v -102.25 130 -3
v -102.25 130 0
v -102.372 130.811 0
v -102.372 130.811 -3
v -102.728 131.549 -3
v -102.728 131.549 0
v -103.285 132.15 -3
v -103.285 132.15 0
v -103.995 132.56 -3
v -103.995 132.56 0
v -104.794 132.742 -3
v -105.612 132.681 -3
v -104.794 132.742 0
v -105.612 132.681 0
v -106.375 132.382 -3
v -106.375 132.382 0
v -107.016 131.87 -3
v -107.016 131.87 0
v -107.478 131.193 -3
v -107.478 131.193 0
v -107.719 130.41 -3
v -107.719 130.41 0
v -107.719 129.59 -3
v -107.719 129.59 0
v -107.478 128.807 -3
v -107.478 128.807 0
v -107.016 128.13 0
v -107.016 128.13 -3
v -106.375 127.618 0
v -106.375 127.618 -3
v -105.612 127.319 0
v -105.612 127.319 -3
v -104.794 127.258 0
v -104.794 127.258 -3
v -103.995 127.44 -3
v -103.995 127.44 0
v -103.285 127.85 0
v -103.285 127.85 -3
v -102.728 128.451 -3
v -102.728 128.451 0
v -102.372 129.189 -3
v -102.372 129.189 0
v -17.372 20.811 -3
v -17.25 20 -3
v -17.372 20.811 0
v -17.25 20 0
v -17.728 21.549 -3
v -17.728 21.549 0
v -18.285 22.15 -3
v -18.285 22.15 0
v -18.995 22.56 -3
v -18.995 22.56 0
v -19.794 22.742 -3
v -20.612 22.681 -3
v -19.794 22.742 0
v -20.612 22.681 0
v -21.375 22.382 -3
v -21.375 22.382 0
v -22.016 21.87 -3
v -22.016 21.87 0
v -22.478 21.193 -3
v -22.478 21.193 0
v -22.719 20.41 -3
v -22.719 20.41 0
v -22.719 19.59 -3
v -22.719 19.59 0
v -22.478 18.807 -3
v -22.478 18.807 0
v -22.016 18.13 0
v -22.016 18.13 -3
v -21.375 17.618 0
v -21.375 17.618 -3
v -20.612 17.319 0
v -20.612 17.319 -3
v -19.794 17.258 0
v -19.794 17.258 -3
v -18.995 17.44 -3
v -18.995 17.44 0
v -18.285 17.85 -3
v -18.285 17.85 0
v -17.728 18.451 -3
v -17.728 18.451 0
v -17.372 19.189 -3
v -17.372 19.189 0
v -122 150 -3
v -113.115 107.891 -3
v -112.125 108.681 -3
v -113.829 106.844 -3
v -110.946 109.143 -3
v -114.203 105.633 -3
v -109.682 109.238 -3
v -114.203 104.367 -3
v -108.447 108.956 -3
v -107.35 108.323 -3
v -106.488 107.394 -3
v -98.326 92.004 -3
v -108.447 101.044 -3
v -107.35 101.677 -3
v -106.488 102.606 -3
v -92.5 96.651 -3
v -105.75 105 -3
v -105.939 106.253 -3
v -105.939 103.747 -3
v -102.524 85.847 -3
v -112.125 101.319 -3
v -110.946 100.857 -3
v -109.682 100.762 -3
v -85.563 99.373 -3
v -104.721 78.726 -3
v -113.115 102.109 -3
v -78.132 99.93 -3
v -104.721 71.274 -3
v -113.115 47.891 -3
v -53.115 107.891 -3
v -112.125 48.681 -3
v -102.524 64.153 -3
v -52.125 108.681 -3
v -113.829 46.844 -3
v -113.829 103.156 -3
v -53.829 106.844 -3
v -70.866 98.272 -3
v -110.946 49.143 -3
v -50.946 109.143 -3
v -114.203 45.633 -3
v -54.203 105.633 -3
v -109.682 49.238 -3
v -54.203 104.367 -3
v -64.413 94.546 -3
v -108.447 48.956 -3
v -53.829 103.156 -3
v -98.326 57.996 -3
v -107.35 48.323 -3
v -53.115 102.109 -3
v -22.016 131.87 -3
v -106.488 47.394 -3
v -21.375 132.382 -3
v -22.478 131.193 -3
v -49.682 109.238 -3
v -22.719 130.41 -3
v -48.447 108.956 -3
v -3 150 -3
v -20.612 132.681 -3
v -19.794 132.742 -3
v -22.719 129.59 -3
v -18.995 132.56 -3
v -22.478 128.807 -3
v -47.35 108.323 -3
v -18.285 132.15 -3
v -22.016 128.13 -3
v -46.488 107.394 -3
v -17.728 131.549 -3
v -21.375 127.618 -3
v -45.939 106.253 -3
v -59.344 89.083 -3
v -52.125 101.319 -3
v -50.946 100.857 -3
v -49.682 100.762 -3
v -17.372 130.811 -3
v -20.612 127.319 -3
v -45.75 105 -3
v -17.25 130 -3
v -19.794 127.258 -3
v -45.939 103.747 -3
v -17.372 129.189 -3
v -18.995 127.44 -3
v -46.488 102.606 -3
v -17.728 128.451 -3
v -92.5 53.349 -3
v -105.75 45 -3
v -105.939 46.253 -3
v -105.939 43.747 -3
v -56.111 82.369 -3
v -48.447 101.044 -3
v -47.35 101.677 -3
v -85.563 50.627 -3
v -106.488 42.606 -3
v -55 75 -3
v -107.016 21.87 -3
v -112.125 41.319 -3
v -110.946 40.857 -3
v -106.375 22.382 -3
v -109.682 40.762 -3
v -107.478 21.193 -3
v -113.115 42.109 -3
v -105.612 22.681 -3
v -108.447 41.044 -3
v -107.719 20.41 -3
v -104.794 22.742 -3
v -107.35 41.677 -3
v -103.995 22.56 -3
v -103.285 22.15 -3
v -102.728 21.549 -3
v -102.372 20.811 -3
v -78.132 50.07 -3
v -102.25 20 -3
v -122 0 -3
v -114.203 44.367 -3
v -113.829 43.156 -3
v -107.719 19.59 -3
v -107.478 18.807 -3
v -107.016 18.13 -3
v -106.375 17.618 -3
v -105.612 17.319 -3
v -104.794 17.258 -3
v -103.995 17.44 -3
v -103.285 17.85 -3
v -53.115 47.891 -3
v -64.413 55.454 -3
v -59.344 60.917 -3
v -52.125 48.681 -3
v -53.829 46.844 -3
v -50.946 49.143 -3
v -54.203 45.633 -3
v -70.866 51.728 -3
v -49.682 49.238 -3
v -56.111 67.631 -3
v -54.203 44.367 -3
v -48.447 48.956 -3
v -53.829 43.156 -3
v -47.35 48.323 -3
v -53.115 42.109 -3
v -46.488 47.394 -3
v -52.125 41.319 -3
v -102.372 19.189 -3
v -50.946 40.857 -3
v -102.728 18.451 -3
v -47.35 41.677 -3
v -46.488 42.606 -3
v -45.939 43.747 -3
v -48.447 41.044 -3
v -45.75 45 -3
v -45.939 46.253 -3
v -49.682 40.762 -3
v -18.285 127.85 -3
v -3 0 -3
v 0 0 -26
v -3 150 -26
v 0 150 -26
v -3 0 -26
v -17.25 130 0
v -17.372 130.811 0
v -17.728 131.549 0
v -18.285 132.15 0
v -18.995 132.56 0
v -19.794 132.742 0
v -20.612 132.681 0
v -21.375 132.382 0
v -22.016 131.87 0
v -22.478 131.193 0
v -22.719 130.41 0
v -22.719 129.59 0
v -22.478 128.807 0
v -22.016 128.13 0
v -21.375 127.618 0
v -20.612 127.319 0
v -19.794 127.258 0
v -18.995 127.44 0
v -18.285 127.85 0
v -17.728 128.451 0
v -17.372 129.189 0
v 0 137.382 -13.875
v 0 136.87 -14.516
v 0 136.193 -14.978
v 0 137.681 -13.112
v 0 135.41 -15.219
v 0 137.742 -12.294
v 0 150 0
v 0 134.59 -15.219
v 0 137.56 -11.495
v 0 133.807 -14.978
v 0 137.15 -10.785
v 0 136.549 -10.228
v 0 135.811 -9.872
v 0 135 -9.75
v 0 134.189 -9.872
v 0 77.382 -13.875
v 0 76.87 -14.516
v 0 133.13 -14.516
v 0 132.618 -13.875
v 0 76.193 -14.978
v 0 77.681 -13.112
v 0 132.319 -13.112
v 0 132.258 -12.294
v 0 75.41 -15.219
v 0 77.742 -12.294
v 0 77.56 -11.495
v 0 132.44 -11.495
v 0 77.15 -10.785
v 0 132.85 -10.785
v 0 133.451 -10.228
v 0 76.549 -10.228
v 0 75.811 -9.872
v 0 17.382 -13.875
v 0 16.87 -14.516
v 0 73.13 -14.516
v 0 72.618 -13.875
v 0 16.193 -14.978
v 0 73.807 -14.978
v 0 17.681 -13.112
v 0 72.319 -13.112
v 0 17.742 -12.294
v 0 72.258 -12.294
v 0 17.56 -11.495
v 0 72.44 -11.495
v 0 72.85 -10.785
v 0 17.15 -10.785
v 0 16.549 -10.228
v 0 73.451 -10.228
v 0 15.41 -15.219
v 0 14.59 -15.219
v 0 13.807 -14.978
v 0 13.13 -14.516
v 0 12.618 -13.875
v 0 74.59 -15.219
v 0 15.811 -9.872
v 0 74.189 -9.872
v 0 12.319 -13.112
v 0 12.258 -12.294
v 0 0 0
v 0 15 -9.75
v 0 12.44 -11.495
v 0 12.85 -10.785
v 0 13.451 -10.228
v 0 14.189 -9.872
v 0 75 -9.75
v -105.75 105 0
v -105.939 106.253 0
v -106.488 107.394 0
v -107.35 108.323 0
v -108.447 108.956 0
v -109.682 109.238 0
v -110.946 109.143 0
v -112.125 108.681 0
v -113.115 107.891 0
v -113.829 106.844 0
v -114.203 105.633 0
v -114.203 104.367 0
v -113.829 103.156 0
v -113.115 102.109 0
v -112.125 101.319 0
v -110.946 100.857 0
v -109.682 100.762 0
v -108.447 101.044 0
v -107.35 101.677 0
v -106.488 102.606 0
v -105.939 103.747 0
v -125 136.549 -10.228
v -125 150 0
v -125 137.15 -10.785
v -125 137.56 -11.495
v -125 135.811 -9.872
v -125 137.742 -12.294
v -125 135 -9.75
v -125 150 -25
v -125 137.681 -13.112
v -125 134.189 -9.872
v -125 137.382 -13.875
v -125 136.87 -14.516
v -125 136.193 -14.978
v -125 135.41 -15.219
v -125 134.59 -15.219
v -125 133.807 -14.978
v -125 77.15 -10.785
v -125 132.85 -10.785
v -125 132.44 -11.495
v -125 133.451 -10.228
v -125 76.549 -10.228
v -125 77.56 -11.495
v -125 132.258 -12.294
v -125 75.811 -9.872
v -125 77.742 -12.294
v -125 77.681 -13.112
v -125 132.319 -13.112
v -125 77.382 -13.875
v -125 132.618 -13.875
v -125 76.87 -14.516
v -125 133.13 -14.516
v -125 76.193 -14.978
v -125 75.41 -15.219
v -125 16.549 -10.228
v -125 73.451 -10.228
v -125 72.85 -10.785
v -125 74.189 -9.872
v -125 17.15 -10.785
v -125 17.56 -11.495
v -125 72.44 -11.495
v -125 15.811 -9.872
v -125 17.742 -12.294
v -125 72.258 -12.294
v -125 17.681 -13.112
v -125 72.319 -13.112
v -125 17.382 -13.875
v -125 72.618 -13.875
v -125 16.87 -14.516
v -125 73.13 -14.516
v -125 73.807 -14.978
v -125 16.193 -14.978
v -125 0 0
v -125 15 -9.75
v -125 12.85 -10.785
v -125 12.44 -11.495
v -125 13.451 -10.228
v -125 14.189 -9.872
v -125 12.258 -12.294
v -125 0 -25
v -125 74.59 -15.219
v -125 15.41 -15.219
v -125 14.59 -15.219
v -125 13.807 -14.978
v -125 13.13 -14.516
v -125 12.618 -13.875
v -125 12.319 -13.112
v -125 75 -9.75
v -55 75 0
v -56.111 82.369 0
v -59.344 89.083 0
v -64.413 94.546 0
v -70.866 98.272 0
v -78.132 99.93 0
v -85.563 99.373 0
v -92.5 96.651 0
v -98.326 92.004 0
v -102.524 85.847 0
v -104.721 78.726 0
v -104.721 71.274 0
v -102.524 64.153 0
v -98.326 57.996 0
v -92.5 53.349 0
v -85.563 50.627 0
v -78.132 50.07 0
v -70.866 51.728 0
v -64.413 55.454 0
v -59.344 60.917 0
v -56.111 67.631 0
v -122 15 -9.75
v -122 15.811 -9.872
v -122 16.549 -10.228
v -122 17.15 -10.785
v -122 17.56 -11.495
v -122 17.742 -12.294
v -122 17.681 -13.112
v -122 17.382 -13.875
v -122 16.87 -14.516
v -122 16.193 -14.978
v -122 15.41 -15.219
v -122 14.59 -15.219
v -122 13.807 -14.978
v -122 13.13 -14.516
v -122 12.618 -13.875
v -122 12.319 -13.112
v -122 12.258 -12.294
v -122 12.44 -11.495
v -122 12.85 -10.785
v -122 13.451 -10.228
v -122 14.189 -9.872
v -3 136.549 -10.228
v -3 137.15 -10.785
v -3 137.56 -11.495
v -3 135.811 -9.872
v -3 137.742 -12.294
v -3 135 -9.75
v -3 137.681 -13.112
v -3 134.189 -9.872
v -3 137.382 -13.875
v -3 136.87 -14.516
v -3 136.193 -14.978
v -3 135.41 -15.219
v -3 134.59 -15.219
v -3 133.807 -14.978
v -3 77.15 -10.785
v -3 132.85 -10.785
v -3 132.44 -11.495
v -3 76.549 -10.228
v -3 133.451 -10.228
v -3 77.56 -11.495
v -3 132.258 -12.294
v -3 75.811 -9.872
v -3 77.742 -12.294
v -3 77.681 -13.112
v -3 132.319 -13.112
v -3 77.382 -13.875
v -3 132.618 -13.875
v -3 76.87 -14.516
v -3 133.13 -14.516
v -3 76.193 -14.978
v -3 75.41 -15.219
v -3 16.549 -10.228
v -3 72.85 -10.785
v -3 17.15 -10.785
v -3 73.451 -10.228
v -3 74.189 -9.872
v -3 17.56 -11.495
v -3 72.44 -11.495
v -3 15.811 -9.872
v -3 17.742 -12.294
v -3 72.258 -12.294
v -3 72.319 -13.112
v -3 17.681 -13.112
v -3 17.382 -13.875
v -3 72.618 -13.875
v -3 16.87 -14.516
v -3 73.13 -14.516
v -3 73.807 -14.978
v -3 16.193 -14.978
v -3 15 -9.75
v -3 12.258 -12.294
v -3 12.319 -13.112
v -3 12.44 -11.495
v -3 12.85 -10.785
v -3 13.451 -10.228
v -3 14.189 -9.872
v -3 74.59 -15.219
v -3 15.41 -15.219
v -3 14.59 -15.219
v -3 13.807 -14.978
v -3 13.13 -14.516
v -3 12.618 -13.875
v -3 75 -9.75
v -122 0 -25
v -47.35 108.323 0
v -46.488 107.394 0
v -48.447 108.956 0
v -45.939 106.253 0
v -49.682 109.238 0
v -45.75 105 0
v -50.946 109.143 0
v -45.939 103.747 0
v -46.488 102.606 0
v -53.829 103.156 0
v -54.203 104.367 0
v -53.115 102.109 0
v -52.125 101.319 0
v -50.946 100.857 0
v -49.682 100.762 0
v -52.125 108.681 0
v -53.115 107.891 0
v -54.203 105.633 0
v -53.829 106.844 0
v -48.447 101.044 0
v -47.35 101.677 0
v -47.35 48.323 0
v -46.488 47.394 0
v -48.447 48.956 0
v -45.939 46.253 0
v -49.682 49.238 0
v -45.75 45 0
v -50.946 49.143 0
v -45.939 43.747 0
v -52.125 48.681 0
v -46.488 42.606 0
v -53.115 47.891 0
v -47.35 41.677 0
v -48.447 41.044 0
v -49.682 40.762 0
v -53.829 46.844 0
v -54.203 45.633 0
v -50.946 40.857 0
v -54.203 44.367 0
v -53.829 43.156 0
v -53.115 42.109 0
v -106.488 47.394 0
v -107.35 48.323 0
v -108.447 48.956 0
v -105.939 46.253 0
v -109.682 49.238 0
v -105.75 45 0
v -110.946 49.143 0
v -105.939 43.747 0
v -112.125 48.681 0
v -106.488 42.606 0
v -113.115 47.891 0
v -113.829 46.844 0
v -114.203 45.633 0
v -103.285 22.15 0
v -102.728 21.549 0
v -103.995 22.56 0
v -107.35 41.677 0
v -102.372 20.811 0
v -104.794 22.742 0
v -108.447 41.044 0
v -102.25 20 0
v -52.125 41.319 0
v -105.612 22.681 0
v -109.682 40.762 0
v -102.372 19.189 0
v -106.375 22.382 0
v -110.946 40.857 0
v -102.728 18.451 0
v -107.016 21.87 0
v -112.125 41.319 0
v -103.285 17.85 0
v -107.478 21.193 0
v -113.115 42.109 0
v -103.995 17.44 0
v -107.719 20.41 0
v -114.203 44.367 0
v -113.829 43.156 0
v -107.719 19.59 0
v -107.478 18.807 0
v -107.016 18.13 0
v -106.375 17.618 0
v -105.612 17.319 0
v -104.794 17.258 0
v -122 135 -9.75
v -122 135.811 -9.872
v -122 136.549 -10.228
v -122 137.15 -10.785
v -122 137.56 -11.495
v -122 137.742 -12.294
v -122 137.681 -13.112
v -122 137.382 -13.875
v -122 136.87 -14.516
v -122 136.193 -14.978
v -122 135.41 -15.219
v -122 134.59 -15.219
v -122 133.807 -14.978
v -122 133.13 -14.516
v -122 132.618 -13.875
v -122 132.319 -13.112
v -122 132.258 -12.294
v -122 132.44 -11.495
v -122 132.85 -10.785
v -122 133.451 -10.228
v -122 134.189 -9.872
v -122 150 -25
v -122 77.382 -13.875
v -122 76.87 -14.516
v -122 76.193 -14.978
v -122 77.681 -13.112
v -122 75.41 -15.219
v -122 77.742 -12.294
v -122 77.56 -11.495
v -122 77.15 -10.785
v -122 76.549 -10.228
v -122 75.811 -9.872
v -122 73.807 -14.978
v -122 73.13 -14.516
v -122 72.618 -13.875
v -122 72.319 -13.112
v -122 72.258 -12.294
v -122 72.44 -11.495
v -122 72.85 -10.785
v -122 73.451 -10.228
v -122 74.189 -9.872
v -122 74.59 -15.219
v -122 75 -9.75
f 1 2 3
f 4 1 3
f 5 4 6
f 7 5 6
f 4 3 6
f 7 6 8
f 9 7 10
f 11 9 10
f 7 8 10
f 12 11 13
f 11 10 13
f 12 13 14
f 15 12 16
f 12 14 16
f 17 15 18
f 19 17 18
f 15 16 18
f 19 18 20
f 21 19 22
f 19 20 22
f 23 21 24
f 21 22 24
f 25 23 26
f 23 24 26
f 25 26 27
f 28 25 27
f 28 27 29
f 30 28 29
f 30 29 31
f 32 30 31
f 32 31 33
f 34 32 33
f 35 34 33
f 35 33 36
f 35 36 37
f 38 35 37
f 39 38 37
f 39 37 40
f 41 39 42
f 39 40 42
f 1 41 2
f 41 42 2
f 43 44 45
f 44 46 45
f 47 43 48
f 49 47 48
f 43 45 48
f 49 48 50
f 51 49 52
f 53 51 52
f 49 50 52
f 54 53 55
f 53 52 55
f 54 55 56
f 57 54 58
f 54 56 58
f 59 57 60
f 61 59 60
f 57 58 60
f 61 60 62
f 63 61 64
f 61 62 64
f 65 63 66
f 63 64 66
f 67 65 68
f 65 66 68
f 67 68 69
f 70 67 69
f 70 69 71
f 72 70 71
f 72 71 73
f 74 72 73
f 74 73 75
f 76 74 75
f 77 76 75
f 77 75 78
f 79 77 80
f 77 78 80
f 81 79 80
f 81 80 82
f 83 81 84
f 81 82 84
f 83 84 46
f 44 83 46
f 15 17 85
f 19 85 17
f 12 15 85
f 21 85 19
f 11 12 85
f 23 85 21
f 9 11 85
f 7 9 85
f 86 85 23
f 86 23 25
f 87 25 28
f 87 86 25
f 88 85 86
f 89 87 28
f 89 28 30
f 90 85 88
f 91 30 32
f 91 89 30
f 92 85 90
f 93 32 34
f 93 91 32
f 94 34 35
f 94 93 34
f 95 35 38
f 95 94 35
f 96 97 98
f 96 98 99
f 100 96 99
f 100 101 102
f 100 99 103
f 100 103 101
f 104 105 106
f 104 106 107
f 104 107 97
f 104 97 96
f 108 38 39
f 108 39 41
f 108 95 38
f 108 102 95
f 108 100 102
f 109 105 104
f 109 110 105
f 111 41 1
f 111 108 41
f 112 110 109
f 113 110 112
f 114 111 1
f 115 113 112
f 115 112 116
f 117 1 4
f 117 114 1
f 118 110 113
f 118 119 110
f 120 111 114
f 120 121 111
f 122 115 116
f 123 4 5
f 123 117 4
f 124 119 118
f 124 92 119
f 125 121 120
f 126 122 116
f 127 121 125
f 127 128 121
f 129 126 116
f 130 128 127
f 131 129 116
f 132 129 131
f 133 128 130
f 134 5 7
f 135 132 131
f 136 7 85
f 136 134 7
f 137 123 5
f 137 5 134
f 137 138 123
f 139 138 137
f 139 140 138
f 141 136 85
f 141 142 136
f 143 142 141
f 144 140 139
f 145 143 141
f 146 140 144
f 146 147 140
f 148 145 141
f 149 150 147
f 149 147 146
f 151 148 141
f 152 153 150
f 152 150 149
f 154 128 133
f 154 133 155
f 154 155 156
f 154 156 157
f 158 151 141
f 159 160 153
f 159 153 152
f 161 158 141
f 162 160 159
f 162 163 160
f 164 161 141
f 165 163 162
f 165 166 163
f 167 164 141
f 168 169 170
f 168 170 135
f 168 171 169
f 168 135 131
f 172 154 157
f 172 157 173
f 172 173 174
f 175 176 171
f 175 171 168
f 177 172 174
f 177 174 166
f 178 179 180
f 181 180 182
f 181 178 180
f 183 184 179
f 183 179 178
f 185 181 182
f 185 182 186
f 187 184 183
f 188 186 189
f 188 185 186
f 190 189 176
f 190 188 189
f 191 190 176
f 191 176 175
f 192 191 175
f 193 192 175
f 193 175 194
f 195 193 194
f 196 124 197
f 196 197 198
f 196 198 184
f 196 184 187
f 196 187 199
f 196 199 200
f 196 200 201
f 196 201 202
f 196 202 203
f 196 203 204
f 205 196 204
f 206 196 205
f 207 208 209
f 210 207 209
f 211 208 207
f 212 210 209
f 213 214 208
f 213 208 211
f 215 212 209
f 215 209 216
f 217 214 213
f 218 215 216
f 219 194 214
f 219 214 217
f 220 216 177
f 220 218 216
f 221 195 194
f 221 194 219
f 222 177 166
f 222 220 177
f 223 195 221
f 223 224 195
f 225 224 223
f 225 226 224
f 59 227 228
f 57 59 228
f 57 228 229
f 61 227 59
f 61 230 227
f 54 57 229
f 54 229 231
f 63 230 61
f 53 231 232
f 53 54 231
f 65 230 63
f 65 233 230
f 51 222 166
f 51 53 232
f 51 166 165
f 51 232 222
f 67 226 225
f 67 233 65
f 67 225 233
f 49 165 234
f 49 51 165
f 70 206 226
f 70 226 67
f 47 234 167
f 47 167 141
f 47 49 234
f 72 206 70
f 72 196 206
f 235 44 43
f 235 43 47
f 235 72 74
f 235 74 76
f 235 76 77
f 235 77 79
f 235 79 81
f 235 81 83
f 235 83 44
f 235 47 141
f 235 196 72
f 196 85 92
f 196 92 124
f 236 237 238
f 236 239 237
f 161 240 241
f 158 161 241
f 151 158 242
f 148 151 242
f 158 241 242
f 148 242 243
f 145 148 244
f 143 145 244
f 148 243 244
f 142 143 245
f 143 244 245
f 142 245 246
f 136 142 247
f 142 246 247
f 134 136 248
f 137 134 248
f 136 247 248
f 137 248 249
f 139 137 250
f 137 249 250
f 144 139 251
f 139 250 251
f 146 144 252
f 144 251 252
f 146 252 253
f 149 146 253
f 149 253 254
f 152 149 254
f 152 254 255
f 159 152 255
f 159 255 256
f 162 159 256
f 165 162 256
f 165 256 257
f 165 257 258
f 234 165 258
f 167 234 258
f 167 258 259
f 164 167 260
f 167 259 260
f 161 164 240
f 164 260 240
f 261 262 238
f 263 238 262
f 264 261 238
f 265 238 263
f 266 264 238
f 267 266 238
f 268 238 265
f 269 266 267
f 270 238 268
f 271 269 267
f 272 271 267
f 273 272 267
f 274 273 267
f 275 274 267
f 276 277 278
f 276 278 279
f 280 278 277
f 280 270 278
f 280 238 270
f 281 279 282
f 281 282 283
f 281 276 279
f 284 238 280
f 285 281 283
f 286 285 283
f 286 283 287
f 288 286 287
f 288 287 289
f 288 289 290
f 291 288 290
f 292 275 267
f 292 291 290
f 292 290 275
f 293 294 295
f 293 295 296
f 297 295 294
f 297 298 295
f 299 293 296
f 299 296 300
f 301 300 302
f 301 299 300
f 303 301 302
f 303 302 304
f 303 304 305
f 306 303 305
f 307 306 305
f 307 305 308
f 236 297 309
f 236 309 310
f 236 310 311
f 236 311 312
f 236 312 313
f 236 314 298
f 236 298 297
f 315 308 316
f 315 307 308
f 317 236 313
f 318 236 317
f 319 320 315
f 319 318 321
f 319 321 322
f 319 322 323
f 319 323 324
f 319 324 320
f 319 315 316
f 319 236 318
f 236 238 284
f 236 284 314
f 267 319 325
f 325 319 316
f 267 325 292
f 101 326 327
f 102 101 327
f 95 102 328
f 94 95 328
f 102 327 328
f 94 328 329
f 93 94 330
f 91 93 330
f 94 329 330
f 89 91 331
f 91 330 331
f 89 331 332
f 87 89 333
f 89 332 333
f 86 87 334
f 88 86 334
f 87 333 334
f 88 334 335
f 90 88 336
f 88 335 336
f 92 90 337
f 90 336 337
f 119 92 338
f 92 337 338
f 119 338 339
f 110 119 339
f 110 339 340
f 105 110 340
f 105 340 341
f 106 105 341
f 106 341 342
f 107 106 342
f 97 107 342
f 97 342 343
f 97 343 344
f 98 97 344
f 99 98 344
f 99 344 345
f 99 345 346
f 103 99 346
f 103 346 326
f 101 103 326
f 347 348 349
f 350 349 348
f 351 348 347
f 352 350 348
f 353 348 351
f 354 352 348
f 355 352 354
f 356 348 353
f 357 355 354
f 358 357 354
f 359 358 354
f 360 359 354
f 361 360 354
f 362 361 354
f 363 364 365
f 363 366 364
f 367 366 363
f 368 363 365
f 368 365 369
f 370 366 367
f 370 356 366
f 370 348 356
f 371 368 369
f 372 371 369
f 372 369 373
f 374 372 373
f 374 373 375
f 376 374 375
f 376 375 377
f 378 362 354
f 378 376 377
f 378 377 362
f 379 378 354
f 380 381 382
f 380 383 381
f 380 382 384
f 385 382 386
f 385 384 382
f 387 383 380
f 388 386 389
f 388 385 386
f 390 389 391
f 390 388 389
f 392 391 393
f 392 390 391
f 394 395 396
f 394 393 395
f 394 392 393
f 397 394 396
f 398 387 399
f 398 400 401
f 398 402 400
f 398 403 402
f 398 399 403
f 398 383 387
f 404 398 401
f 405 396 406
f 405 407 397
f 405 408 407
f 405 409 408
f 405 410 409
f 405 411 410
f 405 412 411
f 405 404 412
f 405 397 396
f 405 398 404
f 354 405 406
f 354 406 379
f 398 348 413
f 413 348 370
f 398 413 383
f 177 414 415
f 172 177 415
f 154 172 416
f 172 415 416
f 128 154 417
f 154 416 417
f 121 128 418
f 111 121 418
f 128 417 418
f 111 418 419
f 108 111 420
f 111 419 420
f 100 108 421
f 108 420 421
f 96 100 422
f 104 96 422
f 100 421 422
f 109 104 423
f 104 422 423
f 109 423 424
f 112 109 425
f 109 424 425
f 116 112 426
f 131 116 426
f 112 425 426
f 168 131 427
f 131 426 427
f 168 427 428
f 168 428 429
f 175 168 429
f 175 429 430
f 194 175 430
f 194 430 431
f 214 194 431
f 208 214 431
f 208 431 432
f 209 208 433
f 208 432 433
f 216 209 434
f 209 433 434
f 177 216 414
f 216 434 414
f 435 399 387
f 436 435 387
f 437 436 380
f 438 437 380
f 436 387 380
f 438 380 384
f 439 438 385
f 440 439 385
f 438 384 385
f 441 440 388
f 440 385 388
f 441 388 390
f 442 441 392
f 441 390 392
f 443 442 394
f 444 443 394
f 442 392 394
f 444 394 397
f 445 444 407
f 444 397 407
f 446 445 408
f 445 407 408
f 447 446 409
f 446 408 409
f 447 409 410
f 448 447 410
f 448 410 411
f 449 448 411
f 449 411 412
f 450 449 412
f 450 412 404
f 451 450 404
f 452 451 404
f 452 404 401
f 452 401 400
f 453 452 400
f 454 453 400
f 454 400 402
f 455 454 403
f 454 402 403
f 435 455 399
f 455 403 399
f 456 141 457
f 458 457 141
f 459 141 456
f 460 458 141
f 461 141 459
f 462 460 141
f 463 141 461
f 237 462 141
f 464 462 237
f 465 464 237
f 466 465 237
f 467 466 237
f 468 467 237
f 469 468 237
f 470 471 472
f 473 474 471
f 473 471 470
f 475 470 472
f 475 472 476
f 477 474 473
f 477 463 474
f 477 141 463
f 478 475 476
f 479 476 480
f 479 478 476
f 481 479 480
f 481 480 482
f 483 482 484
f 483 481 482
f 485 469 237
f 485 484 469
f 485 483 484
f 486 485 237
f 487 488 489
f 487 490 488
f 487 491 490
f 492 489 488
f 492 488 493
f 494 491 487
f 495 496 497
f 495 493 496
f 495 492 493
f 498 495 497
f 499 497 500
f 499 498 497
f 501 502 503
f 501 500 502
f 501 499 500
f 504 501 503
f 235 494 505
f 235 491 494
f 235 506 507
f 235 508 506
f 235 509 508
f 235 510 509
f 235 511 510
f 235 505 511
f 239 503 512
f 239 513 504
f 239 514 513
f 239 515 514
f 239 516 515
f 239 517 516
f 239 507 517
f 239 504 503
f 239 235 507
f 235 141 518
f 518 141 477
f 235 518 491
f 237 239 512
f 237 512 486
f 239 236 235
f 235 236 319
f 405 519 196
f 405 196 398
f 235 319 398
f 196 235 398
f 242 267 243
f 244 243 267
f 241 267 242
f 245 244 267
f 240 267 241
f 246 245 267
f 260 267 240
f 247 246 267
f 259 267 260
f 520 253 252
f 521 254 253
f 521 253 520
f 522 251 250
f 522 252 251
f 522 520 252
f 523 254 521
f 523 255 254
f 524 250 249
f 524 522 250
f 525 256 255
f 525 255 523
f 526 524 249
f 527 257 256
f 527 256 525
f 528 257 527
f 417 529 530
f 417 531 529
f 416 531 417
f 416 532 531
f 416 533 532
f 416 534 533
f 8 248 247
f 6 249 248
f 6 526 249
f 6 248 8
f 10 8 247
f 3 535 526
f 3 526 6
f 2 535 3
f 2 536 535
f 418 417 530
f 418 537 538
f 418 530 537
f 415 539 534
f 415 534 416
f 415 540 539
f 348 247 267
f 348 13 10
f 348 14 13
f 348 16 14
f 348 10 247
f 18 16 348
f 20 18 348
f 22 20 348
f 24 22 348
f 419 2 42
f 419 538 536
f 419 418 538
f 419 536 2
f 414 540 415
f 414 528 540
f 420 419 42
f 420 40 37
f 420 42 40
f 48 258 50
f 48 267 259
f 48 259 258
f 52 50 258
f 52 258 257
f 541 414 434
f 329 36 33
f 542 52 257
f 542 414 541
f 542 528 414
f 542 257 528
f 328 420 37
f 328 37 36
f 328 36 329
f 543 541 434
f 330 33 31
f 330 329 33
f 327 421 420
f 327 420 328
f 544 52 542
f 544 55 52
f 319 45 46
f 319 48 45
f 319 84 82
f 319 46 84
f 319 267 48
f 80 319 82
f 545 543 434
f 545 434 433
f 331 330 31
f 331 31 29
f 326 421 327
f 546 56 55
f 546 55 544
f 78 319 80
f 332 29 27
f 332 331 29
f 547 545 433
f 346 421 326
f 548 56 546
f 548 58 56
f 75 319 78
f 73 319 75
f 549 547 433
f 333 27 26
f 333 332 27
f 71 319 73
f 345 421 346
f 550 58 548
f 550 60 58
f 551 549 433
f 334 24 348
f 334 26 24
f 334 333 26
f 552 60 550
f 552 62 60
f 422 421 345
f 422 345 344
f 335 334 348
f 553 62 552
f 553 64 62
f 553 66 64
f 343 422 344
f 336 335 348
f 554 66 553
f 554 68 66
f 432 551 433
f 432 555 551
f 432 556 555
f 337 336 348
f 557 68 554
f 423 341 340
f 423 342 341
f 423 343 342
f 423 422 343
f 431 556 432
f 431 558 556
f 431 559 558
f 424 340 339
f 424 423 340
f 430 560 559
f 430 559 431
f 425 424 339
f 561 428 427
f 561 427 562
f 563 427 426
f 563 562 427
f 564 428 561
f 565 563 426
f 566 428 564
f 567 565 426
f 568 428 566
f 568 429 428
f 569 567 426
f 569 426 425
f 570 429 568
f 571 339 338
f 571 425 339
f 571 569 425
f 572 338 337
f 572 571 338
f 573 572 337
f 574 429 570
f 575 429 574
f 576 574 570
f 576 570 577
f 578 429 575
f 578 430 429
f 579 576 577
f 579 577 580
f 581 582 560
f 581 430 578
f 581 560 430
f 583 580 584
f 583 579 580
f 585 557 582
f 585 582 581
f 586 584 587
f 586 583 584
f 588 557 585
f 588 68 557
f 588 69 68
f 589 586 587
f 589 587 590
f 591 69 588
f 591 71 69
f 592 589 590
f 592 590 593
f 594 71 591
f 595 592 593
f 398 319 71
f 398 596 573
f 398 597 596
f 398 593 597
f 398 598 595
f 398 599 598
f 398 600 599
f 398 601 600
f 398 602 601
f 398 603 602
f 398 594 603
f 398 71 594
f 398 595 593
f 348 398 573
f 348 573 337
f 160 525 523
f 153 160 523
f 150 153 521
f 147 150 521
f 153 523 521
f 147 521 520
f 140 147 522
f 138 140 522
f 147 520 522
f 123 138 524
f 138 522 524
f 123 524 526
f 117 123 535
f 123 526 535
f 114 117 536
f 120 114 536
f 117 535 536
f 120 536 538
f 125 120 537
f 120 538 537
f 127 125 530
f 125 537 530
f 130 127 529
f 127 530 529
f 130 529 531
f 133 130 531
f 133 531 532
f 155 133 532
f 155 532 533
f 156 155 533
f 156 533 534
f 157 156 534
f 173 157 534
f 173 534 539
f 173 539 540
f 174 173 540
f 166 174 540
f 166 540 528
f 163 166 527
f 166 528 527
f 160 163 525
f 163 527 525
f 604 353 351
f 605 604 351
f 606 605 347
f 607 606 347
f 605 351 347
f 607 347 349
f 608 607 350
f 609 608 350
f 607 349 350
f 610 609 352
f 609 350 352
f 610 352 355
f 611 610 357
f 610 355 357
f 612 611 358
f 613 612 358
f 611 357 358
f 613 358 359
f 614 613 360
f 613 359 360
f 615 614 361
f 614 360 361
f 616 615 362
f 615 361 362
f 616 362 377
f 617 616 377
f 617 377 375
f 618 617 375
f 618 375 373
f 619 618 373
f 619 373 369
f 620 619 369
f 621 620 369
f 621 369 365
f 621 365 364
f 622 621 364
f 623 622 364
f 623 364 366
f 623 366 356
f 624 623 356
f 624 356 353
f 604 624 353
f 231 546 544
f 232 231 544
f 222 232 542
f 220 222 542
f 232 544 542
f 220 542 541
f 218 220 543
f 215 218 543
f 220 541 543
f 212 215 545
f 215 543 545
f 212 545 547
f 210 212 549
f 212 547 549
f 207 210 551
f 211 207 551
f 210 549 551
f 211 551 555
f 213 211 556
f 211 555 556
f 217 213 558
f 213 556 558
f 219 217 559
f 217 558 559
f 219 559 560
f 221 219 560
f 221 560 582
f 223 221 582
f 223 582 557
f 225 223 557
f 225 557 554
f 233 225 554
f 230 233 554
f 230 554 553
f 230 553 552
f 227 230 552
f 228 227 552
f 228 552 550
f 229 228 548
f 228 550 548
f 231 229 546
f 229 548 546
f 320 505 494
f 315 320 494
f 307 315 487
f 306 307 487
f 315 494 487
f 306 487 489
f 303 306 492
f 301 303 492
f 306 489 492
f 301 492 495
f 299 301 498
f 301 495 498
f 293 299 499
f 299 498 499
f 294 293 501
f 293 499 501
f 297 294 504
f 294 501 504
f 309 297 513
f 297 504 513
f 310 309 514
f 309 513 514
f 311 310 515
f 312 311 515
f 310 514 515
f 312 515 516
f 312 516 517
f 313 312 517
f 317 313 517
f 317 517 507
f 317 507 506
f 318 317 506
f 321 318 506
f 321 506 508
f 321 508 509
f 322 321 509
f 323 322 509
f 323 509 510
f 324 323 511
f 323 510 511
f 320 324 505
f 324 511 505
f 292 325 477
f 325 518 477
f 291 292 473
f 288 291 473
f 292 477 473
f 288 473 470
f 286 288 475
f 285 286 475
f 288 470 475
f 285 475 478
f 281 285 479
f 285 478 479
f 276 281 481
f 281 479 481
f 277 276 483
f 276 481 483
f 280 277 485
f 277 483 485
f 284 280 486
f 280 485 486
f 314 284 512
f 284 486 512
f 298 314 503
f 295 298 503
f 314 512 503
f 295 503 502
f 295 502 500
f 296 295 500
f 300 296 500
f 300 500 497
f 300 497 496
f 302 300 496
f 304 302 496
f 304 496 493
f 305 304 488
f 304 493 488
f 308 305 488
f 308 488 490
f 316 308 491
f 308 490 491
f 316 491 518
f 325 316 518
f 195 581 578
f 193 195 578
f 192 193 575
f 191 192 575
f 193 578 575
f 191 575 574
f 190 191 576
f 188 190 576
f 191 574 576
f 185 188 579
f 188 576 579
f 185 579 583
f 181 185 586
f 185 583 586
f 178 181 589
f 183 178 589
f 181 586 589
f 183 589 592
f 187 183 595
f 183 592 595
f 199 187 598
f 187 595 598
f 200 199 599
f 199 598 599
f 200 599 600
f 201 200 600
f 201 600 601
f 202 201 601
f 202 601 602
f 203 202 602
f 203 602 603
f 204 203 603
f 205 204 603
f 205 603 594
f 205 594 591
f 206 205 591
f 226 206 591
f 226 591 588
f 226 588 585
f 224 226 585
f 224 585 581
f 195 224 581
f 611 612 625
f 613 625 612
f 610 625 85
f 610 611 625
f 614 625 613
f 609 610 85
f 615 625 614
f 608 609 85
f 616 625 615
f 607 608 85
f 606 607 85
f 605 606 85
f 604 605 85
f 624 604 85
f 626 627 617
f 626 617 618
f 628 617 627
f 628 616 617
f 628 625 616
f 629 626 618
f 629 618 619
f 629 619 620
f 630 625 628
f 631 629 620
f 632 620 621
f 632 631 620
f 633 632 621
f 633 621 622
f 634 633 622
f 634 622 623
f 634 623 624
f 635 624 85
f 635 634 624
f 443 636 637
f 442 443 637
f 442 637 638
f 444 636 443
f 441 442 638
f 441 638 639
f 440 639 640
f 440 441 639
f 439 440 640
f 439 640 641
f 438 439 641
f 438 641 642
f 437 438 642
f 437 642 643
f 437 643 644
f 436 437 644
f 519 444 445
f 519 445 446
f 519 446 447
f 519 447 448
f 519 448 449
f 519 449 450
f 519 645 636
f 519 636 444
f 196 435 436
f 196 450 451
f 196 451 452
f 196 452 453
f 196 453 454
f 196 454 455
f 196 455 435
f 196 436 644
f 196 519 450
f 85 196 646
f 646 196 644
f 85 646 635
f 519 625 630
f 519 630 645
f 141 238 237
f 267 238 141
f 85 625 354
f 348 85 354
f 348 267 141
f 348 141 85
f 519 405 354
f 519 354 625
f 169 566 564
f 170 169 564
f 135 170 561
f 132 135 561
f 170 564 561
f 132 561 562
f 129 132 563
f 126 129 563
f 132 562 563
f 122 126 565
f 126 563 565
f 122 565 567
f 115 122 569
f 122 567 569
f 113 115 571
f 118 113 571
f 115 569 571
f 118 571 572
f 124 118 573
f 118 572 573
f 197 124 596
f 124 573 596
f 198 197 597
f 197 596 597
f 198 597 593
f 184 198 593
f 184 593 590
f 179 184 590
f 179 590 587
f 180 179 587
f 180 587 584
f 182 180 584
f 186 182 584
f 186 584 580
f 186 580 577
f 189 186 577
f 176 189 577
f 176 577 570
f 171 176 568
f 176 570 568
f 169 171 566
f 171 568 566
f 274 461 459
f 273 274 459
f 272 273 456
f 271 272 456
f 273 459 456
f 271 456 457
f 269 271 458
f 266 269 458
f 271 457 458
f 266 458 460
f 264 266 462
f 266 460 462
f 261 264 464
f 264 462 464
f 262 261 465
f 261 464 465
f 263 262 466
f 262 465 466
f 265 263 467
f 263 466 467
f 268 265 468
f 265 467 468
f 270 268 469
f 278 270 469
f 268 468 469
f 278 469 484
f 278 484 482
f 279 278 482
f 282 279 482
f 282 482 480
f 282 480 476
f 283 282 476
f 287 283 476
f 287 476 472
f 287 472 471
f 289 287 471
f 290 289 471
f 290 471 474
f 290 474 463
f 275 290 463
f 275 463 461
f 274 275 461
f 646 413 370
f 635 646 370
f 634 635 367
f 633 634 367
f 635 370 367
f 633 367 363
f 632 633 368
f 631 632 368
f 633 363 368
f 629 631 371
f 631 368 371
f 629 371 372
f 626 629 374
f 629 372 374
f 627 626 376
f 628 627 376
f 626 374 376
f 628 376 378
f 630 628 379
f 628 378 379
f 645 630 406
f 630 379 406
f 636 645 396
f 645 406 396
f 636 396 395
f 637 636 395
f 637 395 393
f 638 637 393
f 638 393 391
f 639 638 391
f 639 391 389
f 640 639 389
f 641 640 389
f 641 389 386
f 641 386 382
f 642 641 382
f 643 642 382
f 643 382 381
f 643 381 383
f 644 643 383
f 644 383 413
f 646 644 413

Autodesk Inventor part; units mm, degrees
ref_plane "YZ Plane" through (0, 0, 0) normal (1, 0, 0) x (0, 1, 0)
ref_plane "XZ Plane" through (0, 0, 0) normal (0, 1, 0) x (-1, 0, 0)
ref_plane "XY Plane" through (0, 0, 0) normal (0, 0, 1) x (1, 0, 0)
sketch "Sketch1" plane through (0, 0, 0) normal (0, 1, 0) x (-1, 0, 0)
  line L0 (0, 0) -> (125, 0)
  line L1 (0, 0) -> (125, 0) construction
  line L2 (125, 0) -> (125, -25)
  line L3 (125, -25) -> (122, -25)
  line L4 (122, -25) -> (122, -3)
  line L5 (122, -3) -> (3, -3)
  line L6 (3, -3) -> (3, -26)
  line L7 (3, -26) -> (0, -26)
  line L8 (0, -26) -> (0, 0)
  dimension "d0" = 125
  dimension "d2" = 25
  dimension "d3" = 90
  dimension "d4" = 90
  dimension "d5" = 3
  dimension "d6" = 22
  dimension "d7" = 119
  dimension "d8" = 90
  dimension "d9" = 23
  dimension "d10" = 90
  dimension "d11" = 3
  dimension "d12" = 90
extrude "Extrusion1" add sketch "Sketch1" along normal blind 150
sketch "Sketch2" plane through (-125, 0, 0) normal (0, 0, 1) x (1, 0, 0)
  circle A0 centre (15, 105) radius 4.25
  circle A1 centre (75, 105) radius 4.25
  circle A2 centre (15, 45) radius 4.25
  circle A3 centre (75, 45) radius 4.25
  line L0 (125, 0) -> (125, 150) projected
  line L1 (125, 0) -> (0, 0) projected
  circle A4 centre (45, 75) radius 25
  dimension "d15" = 8.5
  dimension "d16" = 8.5
  dimension "d17" = 8.5
  dimension "d18" = 8.5
  dimension "d19" = 60
  dimension "d20" = 60
  dimension "d21" = 60
  dimension "d22" = 60
  dimension "d23" = 60
  dimension "d24" = 60
  dimension "d25" = 50
  dimension "d26" = 45
  dimension "d27" = 50
  dimension "d28" = 80
  dimension "d29" = 75
extrude "Extrusion2" cut sketch "Sketch2" against normal blind 10
sketch "Sketch3" plane through (-125, 0, -25) normal (-1, 0, 0) x (0, 0, 1)
  circle A0 centre (12.5, 15) radius 2.75
  circle A1 centre (12.5, 135) radius 2.75
  line L0 (25, 0) -> (0, 0) projected
  line L1 (0, 150) -> (25, 150) projected
  line L2 (0, 0) -> (0, 150) projected
  line L3 (25, 0) -> (25, 150) projected
  circle A2 centre (12.5, 75) radius 2.75
  dimension "d32" = 5.5
  dimension "d33" = 5.5
  dimension "d34" = 15
  dimension "d35" = 15
  dimension "d36" = 12.5
  dimension "d37" = 12.5
  dimension "d38" = 5.5
  dimension "d39" = 12.5
  dimension "d40" = 75
extrude "Extrusion3" cut sketch "Sketch3" against normal blind 154.4625 contours A0 | A1 | A2
sketch "Sketch5" plane through (-125, 0, 0) normal (0, 0, 1) x (1, 0, 0)
  circle A0 centre (20, 130) radius 2.75
  circle A1 centre (105, 130) radius 2.75
  circle A2 centre (105, 20) radius 2.75
  circle A3 centre (20, 20) radius 2.75
  line L0 (0, 0) -> (0, 150) projected
  line L1 (0, 150) -> (125, 150) projected
  line L2 (125, 0) -> (125, 150) projected
  line L3 (125, 0) -> (0, 0) projected
  dimension "d45" = 5.5
  dimension "d46" = 5.5
  dimension "d47" = 5.5
  dimension "d48" = 5.5
  dimension "d49" = 20
  dimension "d50" = 20
  dimension "d51" = 20
  dimension "d52" = 20
  dimension "d53" = 20
  dimension "d54" = 20
  dimension "d55" = 20
  dimension "d56" = 20
extrude "Extrusion5" cut sketch "Sketch5" against normal through all contours A0 | A1 | A2 | A3
equation "\"d50\" = d49"
equation "\"d51\" = d49"
equation "\"d52\" = d49"
equation "\"d53\" = d49"
equation "\"d54\" = d49"
equation "\"d55\" = d49"
equation "\"d56\" = d49"
properties part number "Pneumatic Connector" material "Aluminum 6061"
